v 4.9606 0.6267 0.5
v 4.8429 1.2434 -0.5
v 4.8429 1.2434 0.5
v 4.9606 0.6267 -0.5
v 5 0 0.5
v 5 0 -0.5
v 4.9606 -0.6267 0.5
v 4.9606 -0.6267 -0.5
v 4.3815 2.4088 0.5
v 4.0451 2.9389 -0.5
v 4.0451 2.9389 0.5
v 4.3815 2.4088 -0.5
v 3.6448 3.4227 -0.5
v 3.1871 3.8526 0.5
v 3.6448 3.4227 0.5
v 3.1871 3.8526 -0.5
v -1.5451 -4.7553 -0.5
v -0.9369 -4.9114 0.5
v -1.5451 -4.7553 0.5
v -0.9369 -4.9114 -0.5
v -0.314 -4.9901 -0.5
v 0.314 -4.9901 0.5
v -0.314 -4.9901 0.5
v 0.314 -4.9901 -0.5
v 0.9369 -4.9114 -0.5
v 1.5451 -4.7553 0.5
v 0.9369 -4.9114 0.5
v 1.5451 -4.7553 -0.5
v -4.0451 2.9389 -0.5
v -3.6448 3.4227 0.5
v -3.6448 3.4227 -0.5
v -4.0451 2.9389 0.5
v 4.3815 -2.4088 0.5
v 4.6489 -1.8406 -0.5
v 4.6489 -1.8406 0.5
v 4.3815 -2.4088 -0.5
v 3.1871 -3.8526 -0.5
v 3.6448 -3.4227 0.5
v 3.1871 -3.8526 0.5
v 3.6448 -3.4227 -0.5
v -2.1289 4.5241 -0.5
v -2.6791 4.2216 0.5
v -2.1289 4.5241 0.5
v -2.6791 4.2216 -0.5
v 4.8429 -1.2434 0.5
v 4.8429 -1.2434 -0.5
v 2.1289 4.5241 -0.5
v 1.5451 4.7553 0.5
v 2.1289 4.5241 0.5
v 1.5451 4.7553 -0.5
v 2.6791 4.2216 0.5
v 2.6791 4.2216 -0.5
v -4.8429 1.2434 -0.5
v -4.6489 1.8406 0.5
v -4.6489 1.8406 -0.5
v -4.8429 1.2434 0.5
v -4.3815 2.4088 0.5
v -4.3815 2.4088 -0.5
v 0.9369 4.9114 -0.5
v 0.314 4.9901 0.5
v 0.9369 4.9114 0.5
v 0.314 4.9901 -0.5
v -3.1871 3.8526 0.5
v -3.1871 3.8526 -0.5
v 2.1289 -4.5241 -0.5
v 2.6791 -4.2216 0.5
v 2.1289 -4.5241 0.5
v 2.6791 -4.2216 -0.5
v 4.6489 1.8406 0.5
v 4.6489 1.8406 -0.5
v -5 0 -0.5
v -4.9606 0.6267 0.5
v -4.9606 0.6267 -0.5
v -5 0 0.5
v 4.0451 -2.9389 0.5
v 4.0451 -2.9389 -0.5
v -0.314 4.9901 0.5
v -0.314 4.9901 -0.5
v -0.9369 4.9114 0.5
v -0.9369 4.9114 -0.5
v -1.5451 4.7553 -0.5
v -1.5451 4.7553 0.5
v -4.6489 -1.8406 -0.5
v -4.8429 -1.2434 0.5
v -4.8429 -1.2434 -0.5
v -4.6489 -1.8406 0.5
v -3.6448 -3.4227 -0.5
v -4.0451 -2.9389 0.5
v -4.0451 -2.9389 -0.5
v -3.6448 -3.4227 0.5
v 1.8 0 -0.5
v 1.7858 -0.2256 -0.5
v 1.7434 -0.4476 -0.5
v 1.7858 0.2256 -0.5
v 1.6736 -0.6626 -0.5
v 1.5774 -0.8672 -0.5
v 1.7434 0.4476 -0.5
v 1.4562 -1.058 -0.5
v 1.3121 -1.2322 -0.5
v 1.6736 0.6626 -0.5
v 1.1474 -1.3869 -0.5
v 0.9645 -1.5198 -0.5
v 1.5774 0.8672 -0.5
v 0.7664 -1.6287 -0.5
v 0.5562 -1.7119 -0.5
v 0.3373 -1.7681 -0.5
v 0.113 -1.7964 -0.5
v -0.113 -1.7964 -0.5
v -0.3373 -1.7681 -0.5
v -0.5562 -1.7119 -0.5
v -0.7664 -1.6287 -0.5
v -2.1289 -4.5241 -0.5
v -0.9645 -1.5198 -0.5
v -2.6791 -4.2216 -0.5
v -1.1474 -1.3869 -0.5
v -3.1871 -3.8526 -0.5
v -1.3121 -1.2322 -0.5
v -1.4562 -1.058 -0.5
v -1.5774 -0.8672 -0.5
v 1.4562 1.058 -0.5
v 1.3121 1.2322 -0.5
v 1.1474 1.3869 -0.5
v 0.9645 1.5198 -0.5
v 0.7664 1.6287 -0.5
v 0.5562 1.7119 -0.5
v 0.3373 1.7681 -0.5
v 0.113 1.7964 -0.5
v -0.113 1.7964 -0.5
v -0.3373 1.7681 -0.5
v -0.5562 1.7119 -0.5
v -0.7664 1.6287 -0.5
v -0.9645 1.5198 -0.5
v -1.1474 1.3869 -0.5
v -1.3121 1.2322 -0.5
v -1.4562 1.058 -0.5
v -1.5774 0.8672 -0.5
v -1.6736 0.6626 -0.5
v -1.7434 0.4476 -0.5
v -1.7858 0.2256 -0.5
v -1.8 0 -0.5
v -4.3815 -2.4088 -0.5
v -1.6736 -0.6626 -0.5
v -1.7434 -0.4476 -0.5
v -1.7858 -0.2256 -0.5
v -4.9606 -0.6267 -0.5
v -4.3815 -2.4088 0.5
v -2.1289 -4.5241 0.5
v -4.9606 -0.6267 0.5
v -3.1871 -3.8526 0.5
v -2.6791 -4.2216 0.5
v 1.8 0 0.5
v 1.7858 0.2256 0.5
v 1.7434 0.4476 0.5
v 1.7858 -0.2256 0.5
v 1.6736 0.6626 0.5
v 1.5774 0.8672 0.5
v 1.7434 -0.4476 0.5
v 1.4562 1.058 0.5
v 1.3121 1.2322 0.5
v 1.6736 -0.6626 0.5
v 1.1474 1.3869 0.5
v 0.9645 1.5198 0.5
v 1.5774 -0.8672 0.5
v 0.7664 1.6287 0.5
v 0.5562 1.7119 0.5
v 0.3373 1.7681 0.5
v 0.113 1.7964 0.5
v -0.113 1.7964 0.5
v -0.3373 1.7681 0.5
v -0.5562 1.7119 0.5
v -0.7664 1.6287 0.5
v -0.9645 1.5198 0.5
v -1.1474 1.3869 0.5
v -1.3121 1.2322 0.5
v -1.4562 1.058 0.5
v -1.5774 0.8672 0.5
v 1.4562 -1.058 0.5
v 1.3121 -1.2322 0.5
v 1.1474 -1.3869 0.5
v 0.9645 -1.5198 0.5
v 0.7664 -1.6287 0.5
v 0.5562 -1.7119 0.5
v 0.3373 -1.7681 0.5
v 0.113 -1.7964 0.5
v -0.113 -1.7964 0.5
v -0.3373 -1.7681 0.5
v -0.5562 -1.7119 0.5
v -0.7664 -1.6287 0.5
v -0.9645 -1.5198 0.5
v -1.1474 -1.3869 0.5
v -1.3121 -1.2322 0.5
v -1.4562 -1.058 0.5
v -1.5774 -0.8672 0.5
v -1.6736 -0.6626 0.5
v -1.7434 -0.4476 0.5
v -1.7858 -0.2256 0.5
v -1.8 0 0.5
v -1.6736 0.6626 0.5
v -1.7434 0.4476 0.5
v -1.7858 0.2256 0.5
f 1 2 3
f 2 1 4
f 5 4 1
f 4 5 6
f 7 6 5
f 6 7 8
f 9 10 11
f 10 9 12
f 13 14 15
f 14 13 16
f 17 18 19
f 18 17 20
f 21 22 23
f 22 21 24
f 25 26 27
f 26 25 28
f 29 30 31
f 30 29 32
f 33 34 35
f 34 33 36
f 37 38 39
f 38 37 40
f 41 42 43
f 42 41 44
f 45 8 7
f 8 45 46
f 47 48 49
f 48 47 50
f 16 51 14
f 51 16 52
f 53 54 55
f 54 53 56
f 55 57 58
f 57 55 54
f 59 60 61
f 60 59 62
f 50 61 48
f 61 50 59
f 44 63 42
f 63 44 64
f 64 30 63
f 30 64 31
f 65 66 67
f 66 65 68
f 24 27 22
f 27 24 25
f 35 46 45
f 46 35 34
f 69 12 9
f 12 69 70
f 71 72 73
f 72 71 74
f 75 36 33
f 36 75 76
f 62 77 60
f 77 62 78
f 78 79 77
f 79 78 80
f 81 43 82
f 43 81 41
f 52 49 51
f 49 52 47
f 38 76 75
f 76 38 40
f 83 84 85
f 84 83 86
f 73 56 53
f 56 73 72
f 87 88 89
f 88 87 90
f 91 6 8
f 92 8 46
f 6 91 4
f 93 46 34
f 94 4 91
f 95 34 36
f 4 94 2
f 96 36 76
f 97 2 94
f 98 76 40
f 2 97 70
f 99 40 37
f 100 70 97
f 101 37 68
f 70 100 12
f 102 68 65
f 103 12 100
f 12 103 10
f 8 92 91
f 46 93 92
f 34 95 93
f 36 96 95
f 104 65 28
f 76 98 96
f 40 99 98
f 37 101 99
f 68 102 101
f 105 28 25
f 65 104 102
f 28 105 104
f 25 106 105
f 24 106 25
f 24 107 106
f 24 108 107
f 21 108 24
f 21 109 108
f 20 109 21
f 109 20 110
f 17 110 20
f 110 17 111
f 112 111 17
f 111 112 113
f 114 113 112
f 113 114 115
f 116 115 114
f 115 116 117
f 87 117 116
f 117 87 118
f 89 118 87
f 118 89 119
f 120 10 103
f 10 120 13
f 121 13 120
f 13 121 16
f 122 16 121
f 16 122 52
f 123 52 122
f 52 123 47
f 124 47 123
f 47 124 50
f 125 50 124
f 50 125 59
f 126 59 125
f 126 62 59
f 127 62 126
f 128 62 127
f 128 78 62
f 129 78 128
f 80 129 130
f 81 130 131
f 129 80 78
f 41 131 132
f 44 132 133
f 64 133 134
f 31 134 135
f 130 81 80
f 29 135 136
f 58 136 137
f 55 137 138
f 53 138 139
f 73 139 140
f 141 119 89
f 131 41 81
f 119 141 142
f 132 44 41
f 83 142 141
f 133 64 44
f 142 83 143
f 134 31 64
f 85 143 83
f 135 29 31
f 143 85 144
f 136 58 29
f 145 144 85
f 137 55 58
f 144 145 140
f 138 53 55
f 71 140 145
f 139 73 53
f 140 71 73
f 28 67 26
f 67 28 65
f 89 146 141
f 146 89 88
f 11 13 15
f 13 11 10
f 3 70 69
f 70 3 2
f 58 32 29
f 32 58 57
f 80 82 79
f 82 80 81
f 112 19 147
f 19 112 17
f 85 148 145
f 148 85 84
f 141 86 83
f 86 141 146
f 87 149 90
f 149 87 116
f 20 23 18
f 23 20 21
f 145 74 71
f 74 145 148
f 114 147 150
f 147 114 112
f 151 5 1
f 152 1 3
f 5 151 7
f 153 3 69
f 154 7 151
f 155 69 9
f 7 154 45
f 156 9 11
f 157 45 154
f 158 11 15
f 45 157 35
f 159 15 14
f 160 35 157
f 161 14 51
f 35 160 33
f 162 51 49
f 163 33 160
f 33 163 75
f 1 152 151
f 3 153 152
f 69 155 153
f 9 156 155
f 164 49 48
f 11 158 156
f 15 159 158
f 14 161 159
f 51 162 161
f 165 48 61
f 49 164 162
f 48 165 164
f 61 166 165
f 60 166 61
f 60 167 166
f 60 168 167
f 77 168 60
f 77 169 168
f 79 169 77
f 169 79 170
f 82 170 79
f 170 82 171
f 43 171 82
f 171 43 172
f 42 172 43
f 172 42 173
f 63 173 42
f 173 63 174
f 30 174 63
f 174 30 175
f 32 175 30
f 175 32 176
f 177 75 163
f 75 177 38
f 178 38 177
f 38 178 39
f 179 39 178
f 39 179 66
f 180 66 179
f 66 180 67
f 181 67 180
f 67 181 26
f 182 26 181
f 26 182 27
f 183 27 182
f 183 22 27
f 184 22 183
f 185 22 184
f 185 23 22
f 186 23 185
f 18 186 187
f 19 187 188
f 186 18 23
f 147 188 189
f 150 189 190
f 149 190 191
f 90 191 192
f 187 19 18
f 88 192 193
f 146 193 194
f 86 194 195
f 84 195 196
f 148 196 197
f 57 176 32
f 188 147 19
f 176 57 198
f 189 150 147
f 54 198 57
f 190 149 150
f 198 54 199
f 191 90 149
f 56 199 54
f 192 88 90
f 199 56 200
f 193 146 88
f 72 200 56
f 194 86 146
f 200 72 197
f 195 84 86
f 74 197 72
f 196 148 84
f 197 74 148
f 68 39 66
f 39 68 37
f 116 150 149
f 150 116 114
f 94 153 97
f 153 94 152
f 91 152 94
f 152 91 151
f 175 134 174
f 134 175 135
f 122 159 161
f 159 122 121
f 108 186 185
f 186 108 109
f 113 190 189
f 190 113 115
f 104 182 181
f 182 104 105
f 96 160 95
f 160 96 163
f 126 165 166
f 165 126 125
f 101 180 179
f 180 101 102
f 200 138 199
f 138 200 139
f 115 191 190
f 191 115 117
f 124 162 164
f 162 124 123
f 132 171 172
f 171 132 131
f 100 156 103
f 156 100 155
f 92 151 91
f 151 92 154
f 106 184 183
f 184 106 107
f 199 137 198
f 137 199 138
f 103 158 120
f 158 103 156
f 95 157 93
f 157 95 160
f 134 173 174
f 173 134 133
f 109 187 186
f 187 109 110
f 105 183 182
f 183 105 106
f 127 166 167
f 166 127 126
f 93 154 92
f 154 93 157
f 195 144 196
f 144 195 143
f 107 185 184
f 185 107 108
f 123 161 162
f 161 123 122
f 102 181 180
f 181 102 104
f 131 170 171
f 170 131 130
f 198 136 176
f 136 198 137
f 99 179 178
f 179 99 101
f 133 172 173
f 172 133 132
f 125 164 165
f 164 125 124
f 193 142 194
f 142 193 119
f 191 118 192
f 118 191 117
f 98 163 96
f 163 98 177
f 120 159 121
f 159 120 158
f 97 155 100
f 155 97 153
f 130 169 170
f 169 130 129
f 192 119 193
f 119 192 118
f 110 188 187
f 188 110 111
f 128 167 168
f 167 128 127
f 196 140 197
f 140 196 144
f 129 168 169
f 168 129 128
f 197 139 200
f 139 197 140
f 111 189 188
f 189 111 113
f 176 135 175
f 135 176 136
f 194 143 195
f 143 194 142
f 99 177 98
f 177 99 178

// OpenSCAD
$fn = 50;


difference() {
	union() {
		translate(v = [0, 0, -0.5000000000]) {
			cylinder(h = 1, r = 5.0000000000);
		}
	}
	union() {
		#translate(v = [0, 0, -100.0000000000]) {
			cylinder(h = 200, r = 1.8000000000);
		}
	}
}
